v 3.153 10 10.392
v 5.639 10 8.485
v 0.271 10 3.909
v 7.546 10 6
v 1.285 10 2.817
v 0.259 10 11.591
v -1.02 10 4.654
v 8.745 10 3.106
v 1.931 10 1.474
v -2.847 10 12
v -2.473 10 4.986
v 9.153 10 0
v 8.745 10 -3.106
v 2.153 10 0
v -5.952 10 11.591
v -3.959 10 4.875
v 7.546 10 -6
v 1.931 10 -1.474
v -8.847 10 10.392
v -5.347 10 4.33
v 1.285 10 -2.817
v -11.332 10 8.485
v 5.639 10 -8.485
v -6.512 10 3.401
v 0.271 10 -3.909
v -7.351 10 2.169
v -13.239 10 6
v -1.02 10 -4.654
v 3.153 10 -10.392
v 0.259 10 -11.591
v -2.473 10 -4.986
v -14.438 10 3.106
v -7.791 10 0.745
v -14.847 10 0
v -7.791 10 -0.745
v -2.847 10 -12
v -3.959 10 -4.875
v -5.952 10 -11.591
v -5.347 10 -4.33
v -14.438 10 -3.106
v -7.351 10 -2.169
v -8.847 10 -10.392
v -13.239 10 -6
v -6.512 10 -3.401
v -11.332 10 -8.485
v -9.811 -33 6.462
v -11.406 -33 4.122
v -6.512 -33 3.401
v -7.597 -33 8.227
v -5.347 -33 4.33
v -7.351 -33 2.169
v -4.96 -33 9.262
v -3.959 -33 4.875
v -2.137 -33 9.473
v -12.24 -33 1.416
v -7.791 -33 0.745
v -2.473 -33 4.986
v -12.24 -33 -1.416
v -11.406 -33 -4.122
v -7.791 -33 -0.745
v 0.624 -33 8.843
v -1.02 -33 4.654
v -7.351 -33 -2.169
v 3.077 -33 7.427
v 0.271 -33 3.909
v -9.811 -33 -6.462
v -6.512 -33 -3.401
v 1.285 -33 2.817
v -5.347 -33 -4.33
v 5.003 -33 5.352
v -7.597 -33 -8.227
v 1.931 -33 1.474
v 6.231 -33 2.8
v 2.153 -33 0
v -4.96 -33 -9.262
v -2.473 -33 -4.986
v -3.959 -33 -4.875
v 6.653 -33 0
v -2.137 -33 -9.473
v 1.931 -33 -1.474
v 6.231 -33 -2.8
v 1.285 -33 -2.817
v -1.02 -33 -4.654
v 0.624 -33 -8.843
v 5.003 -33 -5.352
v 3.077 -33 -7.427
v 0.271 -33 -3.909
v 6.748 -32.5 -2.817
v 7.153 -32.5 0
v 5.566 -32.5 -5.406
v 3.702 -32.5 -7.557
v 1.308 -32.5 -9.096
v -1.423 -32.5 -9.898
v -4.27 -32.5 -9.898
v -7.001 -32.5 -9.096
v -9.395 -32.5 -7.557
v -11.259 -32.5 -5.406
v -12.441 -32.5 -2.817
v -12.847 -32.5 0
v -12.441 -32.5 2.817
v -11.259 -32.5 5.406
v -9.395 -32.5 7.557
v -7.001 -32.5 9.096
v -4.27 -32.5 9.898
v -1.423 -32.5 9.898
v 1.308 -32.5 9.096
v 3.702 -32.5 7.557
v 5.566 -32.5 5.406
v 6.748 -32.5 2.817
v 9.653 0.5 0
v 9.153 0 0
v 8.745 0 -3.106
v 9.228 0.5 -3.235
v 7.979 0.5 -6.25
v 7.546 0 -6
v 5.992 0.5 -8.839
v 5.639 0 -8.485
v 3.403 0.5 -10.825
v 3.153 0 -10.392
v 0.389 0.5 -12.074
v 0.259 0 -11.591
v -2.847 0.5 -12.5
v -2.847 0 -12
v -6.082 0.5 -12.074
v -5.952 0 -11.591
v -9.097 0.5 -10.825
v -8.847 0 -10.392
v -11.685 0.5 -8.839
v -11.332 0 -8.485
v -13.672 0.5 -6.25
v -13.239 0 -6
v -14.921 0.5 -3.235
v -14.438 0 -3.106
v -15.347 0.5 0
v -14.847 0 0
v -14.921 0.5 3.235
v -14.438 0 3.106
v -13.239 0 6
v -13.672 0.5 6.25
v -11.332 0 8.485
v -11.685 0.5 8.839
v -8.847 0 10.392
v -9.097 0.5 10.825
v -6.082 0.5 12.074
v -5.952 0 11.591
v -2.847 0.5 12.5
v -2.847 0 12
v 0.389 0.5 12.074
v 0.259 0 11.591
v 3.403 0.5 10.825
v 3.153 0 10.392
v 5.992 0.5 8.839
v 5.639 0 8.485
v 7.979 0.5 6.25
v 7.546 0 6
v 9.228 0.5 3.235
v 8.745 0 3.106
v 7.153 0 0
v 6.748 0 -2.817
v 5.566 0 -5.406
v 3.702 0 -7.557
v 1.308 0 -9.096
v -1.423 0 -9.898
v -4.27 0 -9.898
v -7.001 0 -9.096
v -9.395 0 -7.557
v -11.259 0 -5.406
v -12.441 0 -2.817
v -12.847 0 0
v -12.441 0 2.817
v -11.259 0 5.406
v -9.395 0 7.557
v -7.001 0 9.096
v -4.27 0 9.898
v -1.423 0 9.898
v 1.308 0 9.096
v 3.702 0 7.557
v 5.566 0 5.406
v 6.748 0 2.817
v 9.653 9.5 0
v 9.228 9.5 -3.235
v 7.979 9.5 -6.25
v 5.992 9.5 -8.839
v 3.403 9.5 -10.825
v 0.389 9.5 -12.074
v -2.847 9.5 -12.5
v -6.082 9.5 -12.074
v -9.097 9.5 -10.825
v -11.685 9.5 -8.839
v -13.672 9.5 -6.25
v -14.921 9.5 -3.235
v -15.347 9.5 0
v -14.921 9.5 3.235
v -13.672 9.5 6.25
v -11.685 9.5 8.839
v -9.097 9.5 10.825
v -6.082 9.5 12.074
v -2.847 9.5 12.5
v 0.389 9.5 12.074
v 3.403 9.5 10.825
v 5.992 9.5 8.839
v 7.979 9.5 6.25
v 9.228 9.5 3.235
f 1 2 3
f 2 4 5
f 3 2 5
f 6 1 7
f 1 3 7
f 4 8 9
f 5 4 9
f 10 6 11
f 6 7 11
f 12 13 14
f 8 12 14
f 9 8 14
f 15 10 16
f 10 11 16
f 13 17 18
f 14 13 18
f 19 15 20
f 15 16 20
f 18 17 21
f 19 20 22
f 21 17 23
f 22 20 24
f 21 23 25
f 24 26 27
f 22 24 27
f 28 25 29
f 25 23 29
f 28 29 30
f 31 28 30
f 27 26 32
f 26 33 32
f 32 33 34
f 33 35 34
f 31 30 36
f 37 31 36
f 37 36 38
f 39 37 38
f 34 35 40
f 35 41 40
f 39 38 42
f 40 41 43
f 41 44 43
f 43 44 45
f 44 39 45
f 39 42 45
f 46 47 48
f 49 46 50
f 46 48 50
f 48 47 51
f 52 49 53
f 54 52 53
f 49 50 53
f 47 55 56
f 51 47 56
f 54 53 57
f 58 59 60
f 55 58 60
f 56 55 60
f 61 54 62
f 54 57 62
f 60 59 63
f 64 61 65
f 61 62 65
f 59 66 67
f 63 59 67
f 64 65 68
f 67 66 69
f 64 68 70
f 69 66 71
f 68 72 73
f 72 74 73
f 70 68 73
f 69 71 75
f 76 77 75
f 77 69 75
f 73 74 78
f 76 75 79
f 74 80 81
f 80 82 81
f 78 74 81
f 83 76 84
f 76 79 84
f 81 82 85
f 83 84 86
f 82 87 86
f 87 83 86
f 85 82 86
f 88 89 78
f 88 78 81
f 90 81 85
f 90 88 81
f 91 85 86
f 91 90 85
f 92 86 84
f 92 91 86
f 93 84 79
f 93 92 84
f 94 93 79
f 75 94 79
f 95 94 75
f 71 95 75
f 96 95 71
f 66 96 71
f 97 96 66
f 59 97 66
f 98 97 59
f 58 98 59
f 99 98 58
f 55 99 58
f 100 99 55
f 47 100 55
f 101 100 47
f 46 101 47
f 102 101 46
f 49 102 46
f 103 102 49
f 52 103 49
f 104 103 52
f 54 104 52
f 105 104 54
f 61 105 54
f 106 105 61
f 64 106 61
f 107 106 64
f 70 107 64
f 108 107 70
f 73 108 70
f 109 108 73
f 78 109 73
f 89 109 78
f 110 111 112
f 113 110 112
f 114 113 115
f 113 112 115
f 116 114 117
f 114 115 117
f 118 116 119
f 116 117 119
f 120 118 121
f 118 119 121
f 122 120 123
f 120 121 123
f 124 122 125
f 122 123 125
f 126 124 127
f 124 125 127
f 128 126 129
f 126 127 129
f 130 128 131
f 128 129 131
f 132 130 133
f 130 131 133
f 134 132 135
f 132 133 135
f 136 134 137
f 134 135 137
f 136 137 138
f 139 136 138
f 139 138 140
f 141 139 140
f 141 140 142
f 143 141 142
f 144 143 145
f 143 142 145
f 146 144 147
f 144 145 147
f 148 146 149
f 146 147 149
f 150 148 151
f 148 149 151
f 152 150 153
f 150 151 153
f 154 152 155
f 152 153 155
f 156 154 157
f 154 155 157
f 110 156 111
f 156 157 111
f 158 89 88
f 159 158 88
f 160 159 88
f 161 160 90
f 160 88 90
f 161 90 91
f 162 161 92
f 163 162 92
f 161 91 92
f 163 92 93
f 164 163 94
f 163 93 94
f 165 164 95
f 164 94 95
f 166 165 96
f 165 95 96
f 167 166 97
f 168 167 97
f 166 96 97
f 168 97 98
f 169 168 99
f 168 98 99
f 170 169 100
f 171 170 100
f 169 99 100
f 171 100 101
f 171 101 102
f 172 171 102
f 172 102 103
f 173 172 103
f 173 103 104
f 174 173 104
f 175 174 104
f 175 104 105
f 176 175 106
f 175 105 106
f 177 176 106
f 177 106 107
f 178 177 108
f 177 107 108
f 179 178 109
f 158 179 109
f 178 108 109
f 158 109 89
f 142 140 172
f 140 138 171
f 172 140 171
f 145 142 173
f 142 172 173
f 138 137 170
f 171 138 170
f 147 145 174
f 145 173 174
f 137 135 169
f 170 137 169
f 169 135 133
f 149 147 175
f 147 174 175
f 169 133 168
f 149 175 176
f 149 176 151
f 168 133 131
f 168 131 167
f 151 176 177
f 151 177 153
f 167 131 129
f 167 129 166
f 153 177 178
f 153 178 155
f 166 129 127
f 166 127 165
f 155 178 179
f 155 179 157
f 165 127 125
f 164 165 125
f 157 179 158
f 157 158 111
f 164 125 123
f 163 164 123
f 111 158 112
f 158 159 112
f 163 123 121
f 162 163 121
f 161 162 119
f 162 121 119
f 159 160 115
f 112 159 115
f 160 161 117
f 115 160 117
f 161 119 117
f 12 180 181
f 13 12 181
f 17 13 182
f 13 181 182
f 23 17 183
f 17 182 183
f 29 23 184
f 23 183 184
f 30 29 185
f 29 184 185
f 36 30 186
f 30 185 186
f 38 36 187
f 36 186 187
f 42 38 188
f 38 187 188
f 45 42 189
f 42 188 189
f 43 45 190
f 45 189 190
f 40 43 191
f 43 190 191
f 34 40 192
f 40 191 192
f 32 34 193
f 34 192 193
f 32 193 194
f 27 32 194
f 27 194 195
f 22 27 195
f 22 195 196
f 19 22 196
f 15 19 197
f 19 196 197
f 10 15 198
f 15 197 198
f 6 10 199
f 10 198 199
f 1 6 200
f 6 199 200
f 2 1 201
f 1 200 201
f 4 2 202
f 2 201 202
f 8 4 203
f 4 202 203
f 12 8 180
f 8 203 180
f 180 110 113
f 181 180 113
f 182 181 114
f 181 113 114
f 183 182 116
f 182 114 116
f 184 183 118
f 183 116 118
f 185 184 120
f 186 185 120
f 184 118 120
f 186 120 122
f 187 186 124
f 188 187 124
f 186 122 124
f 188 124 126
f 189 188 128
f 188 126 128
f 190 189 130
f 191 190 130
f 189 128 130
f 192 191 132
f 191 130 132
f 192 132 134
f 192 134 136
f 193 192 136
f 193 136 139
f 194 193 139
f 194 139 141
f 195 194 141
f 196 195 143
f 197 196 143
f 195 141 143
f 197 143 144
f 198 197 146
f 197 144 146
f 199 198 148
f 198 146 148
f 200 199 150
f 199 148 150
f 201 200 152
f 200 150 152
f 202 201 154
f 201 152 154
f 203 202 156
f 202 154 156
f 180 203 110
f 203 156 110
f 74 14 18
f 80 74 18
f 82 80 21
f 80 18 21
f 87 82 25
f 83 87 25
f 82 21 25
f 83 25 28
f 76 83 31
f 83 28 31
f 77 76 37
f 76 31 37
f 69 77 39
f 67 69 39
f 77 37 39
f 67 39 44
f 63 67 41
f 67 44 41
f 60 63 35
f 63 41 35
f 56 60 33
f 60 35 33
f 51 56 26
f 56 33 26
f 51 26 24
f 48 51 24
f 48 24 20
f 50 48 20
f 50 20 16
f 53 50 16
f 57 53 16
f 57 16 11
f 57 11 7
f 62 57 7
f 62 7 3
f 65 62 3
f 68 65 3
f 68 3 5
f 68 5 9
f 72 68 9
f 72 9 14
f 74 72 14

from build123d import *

# Parameters (mm, degrees)
SKETCH2_R          = 5
CUT_EXTRUDE1_DEPTH = 44
CHAMFER1_SIZE      = 0.5


with BuildPart() as part:
    # Sketch1 → Revolve1 (revolve)
    with BuildSketch(Plane.XY):
        Polygon((-2.846534653, 10), (9.653465347, 10), (9.653465347, 0), (7.153465347, 0), (7.153465347, -33), (-2.846534653, -33), align=None)
    revolve(axis=Axis((-2.846534653, -33, 0), (0, 1, 0)))

    # Sketch2 → Cut-Extrude1 (cut, through all)
    with BuildSketch(Plane(origin=(0, 10, 0), x_dir=(1, 0, 0), z_dir=(0, 1, 0))):
        with Locations((-2.846534653, 0)):
            Circle(SKETCH2_R)
    extrude(amount=-CUT_EXTRUDE1_DEPTH, mode=Mode.SUBTRACT)

    # Chamfer1
    chamfer1_edges = [part.edges().sort_by_distance(p)[0] for p in [
        (-12.846534653, -33, 0),
        (-15.346534653, 0, 0),
        (-15.346534653, 10, 0),
    ]]
    chamfer(chamfer1_edges, length=CHAMFER1_SIZE)


solid = part.part
